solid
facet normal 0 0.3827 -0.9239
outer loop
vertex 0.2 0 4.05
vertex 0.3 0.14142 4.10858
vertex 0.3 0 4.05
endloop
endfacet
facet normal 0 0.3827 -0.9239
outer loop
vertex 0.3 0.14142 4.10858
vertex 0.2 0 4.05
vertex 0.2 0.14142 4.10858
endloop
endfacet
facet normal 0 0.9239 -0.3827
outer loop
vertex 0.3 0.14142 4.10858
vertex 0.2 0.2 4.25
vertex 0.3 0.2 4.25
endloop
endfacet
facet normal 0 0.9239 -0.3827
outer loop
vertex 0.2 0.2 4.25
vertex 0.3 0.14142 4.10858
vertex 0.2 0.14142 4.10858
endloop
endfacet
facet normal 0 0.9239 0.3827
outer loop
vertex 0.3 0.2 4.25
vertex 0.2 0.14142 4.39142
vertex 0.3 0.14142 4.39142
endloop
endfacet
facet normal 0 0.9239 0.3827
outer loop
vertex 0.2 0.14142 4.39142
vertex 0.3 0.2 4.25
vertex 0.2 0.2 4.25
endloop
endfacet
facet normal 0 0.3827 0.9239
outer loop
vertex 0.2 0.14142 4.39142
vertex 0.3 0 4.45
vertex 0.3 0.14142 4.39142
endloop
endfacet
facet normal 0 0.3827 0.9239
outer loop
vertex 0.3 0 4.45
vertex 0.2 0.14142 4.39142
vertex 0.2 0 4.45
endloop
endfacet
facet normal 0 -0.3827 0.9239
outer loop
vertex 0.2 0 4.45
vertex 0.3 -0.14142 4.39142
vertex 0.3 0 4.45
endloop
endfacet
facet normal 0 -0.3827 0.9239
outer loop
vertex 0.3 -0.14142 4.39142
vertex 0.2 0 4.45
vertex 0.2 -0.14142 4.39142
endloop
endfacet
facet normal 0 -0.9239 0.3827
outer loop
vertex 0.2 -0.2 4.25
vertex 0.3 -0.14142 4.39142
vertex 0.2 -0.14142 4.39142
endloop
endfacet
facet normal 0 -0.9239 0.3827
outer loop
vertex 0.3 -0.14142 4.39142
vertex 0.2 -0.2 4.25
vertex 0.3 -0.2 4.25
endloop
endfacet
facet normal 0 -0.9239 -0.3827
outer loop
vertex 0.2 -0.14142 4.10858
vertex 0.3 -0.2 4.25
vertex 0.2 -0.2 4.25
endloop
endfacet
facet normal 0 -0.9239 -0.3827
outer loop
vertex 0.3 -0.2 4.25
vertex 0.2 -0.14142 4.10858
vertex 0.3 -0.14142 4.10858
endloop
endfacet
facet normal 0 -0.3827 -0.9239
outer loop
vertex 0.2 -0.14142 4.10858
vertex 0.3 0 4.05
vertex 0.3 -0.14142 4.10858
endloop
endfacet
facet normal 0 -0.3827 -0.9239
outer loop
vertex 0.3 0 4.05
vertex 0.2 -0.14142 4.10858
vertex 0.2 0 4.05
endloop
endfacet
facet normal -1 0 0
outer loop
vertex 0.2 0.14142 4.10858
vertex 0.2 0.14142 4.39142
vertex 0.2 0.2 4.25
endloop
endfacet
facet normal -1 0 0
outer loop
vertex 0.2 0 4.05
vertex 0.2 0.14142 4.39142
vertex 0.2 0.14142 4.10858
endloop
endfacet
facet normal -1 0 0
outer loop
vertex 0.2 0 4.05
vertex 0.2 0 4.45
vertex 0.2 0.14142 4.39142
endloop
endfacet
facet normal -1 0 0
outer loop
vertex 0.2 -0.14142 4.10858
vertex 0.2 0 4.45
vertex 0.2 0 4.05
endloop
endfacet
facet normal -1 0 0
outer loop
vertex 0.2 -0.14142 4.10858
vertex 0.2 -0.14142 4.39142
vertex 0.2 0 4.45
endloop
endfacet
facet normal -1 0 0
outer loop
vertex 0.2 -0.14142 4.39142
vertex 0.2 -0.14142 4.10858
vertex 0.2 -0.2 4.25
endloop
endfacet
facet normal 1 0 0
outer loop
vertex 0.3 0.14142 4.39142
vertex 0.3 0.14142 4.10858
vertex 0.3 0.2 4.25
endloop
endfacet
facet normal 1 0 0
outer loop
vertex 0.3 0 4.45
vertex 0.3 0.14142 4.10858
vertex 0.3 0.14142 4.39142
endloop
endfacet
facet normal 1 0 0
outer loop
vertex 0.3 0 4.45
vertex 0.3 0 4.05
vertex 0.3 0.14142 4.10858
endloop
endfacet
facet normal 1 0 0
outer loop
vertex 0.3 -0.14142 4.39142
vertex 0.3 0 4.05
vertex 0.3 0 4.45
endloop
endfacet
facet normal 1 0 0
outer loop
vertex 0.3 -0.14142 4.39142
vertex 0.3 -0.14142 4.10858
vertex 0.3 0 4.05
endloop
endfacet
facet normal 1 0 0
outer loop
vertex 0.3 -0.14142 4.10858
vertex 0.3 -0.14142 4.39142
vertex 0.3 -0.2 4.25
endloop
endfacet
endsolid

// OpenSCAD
use <lib.scad>

hd = 36;
ld = 8;

module towerHD($fn=hd) {
	translate([0,0,2.5]) union() {
		cyl(0.1,0.1,5);
		translate([0,0,-2.4]) cyl(0.3,0.3,0.2);
	}
}

module towerLD($fn=ld) {
	translate([0,0,2.5]) union() {
		cyl(0.1,0.1,5);
		translate([0,0,-2.4]) cyl(0.3,0.3,0.2);
	}
}

module plateHD($fn=hd) {
	translate([0.15,0,4.25]) rotate([0,90,0]) hull() {
		translate([0.5,0,0]) cyl(0.25,0.25,0.1);
		translate([-0.5,0,0]) cyl(0.25,0.25,0.1);
	}
}

module plateLD($fn=ld) {
	translate([0.15,0,4.25]) rotate([0,90,0]) hull() {
		translate([0.5,0,0]) cyl(0.25,0.25,0.1);
		translate([-0.5,0,0]) cyl(0.25,0.25,0.1);
	}
}

module lightHD($fn=hd) {
	translate([0.25,0,4.25]) rotate([0,90,0]) cyl(0.2,0.2,0.1);
}

module lightLD($fn=ld) {
	translate([0.25,0,4.25]) rotate([0,90,0]) cyl(0.2,0.2,0.1);
}

//towerHD();
//towerLD();
//plateHD();
//plateLD();
//lightHD();
lightLD();
